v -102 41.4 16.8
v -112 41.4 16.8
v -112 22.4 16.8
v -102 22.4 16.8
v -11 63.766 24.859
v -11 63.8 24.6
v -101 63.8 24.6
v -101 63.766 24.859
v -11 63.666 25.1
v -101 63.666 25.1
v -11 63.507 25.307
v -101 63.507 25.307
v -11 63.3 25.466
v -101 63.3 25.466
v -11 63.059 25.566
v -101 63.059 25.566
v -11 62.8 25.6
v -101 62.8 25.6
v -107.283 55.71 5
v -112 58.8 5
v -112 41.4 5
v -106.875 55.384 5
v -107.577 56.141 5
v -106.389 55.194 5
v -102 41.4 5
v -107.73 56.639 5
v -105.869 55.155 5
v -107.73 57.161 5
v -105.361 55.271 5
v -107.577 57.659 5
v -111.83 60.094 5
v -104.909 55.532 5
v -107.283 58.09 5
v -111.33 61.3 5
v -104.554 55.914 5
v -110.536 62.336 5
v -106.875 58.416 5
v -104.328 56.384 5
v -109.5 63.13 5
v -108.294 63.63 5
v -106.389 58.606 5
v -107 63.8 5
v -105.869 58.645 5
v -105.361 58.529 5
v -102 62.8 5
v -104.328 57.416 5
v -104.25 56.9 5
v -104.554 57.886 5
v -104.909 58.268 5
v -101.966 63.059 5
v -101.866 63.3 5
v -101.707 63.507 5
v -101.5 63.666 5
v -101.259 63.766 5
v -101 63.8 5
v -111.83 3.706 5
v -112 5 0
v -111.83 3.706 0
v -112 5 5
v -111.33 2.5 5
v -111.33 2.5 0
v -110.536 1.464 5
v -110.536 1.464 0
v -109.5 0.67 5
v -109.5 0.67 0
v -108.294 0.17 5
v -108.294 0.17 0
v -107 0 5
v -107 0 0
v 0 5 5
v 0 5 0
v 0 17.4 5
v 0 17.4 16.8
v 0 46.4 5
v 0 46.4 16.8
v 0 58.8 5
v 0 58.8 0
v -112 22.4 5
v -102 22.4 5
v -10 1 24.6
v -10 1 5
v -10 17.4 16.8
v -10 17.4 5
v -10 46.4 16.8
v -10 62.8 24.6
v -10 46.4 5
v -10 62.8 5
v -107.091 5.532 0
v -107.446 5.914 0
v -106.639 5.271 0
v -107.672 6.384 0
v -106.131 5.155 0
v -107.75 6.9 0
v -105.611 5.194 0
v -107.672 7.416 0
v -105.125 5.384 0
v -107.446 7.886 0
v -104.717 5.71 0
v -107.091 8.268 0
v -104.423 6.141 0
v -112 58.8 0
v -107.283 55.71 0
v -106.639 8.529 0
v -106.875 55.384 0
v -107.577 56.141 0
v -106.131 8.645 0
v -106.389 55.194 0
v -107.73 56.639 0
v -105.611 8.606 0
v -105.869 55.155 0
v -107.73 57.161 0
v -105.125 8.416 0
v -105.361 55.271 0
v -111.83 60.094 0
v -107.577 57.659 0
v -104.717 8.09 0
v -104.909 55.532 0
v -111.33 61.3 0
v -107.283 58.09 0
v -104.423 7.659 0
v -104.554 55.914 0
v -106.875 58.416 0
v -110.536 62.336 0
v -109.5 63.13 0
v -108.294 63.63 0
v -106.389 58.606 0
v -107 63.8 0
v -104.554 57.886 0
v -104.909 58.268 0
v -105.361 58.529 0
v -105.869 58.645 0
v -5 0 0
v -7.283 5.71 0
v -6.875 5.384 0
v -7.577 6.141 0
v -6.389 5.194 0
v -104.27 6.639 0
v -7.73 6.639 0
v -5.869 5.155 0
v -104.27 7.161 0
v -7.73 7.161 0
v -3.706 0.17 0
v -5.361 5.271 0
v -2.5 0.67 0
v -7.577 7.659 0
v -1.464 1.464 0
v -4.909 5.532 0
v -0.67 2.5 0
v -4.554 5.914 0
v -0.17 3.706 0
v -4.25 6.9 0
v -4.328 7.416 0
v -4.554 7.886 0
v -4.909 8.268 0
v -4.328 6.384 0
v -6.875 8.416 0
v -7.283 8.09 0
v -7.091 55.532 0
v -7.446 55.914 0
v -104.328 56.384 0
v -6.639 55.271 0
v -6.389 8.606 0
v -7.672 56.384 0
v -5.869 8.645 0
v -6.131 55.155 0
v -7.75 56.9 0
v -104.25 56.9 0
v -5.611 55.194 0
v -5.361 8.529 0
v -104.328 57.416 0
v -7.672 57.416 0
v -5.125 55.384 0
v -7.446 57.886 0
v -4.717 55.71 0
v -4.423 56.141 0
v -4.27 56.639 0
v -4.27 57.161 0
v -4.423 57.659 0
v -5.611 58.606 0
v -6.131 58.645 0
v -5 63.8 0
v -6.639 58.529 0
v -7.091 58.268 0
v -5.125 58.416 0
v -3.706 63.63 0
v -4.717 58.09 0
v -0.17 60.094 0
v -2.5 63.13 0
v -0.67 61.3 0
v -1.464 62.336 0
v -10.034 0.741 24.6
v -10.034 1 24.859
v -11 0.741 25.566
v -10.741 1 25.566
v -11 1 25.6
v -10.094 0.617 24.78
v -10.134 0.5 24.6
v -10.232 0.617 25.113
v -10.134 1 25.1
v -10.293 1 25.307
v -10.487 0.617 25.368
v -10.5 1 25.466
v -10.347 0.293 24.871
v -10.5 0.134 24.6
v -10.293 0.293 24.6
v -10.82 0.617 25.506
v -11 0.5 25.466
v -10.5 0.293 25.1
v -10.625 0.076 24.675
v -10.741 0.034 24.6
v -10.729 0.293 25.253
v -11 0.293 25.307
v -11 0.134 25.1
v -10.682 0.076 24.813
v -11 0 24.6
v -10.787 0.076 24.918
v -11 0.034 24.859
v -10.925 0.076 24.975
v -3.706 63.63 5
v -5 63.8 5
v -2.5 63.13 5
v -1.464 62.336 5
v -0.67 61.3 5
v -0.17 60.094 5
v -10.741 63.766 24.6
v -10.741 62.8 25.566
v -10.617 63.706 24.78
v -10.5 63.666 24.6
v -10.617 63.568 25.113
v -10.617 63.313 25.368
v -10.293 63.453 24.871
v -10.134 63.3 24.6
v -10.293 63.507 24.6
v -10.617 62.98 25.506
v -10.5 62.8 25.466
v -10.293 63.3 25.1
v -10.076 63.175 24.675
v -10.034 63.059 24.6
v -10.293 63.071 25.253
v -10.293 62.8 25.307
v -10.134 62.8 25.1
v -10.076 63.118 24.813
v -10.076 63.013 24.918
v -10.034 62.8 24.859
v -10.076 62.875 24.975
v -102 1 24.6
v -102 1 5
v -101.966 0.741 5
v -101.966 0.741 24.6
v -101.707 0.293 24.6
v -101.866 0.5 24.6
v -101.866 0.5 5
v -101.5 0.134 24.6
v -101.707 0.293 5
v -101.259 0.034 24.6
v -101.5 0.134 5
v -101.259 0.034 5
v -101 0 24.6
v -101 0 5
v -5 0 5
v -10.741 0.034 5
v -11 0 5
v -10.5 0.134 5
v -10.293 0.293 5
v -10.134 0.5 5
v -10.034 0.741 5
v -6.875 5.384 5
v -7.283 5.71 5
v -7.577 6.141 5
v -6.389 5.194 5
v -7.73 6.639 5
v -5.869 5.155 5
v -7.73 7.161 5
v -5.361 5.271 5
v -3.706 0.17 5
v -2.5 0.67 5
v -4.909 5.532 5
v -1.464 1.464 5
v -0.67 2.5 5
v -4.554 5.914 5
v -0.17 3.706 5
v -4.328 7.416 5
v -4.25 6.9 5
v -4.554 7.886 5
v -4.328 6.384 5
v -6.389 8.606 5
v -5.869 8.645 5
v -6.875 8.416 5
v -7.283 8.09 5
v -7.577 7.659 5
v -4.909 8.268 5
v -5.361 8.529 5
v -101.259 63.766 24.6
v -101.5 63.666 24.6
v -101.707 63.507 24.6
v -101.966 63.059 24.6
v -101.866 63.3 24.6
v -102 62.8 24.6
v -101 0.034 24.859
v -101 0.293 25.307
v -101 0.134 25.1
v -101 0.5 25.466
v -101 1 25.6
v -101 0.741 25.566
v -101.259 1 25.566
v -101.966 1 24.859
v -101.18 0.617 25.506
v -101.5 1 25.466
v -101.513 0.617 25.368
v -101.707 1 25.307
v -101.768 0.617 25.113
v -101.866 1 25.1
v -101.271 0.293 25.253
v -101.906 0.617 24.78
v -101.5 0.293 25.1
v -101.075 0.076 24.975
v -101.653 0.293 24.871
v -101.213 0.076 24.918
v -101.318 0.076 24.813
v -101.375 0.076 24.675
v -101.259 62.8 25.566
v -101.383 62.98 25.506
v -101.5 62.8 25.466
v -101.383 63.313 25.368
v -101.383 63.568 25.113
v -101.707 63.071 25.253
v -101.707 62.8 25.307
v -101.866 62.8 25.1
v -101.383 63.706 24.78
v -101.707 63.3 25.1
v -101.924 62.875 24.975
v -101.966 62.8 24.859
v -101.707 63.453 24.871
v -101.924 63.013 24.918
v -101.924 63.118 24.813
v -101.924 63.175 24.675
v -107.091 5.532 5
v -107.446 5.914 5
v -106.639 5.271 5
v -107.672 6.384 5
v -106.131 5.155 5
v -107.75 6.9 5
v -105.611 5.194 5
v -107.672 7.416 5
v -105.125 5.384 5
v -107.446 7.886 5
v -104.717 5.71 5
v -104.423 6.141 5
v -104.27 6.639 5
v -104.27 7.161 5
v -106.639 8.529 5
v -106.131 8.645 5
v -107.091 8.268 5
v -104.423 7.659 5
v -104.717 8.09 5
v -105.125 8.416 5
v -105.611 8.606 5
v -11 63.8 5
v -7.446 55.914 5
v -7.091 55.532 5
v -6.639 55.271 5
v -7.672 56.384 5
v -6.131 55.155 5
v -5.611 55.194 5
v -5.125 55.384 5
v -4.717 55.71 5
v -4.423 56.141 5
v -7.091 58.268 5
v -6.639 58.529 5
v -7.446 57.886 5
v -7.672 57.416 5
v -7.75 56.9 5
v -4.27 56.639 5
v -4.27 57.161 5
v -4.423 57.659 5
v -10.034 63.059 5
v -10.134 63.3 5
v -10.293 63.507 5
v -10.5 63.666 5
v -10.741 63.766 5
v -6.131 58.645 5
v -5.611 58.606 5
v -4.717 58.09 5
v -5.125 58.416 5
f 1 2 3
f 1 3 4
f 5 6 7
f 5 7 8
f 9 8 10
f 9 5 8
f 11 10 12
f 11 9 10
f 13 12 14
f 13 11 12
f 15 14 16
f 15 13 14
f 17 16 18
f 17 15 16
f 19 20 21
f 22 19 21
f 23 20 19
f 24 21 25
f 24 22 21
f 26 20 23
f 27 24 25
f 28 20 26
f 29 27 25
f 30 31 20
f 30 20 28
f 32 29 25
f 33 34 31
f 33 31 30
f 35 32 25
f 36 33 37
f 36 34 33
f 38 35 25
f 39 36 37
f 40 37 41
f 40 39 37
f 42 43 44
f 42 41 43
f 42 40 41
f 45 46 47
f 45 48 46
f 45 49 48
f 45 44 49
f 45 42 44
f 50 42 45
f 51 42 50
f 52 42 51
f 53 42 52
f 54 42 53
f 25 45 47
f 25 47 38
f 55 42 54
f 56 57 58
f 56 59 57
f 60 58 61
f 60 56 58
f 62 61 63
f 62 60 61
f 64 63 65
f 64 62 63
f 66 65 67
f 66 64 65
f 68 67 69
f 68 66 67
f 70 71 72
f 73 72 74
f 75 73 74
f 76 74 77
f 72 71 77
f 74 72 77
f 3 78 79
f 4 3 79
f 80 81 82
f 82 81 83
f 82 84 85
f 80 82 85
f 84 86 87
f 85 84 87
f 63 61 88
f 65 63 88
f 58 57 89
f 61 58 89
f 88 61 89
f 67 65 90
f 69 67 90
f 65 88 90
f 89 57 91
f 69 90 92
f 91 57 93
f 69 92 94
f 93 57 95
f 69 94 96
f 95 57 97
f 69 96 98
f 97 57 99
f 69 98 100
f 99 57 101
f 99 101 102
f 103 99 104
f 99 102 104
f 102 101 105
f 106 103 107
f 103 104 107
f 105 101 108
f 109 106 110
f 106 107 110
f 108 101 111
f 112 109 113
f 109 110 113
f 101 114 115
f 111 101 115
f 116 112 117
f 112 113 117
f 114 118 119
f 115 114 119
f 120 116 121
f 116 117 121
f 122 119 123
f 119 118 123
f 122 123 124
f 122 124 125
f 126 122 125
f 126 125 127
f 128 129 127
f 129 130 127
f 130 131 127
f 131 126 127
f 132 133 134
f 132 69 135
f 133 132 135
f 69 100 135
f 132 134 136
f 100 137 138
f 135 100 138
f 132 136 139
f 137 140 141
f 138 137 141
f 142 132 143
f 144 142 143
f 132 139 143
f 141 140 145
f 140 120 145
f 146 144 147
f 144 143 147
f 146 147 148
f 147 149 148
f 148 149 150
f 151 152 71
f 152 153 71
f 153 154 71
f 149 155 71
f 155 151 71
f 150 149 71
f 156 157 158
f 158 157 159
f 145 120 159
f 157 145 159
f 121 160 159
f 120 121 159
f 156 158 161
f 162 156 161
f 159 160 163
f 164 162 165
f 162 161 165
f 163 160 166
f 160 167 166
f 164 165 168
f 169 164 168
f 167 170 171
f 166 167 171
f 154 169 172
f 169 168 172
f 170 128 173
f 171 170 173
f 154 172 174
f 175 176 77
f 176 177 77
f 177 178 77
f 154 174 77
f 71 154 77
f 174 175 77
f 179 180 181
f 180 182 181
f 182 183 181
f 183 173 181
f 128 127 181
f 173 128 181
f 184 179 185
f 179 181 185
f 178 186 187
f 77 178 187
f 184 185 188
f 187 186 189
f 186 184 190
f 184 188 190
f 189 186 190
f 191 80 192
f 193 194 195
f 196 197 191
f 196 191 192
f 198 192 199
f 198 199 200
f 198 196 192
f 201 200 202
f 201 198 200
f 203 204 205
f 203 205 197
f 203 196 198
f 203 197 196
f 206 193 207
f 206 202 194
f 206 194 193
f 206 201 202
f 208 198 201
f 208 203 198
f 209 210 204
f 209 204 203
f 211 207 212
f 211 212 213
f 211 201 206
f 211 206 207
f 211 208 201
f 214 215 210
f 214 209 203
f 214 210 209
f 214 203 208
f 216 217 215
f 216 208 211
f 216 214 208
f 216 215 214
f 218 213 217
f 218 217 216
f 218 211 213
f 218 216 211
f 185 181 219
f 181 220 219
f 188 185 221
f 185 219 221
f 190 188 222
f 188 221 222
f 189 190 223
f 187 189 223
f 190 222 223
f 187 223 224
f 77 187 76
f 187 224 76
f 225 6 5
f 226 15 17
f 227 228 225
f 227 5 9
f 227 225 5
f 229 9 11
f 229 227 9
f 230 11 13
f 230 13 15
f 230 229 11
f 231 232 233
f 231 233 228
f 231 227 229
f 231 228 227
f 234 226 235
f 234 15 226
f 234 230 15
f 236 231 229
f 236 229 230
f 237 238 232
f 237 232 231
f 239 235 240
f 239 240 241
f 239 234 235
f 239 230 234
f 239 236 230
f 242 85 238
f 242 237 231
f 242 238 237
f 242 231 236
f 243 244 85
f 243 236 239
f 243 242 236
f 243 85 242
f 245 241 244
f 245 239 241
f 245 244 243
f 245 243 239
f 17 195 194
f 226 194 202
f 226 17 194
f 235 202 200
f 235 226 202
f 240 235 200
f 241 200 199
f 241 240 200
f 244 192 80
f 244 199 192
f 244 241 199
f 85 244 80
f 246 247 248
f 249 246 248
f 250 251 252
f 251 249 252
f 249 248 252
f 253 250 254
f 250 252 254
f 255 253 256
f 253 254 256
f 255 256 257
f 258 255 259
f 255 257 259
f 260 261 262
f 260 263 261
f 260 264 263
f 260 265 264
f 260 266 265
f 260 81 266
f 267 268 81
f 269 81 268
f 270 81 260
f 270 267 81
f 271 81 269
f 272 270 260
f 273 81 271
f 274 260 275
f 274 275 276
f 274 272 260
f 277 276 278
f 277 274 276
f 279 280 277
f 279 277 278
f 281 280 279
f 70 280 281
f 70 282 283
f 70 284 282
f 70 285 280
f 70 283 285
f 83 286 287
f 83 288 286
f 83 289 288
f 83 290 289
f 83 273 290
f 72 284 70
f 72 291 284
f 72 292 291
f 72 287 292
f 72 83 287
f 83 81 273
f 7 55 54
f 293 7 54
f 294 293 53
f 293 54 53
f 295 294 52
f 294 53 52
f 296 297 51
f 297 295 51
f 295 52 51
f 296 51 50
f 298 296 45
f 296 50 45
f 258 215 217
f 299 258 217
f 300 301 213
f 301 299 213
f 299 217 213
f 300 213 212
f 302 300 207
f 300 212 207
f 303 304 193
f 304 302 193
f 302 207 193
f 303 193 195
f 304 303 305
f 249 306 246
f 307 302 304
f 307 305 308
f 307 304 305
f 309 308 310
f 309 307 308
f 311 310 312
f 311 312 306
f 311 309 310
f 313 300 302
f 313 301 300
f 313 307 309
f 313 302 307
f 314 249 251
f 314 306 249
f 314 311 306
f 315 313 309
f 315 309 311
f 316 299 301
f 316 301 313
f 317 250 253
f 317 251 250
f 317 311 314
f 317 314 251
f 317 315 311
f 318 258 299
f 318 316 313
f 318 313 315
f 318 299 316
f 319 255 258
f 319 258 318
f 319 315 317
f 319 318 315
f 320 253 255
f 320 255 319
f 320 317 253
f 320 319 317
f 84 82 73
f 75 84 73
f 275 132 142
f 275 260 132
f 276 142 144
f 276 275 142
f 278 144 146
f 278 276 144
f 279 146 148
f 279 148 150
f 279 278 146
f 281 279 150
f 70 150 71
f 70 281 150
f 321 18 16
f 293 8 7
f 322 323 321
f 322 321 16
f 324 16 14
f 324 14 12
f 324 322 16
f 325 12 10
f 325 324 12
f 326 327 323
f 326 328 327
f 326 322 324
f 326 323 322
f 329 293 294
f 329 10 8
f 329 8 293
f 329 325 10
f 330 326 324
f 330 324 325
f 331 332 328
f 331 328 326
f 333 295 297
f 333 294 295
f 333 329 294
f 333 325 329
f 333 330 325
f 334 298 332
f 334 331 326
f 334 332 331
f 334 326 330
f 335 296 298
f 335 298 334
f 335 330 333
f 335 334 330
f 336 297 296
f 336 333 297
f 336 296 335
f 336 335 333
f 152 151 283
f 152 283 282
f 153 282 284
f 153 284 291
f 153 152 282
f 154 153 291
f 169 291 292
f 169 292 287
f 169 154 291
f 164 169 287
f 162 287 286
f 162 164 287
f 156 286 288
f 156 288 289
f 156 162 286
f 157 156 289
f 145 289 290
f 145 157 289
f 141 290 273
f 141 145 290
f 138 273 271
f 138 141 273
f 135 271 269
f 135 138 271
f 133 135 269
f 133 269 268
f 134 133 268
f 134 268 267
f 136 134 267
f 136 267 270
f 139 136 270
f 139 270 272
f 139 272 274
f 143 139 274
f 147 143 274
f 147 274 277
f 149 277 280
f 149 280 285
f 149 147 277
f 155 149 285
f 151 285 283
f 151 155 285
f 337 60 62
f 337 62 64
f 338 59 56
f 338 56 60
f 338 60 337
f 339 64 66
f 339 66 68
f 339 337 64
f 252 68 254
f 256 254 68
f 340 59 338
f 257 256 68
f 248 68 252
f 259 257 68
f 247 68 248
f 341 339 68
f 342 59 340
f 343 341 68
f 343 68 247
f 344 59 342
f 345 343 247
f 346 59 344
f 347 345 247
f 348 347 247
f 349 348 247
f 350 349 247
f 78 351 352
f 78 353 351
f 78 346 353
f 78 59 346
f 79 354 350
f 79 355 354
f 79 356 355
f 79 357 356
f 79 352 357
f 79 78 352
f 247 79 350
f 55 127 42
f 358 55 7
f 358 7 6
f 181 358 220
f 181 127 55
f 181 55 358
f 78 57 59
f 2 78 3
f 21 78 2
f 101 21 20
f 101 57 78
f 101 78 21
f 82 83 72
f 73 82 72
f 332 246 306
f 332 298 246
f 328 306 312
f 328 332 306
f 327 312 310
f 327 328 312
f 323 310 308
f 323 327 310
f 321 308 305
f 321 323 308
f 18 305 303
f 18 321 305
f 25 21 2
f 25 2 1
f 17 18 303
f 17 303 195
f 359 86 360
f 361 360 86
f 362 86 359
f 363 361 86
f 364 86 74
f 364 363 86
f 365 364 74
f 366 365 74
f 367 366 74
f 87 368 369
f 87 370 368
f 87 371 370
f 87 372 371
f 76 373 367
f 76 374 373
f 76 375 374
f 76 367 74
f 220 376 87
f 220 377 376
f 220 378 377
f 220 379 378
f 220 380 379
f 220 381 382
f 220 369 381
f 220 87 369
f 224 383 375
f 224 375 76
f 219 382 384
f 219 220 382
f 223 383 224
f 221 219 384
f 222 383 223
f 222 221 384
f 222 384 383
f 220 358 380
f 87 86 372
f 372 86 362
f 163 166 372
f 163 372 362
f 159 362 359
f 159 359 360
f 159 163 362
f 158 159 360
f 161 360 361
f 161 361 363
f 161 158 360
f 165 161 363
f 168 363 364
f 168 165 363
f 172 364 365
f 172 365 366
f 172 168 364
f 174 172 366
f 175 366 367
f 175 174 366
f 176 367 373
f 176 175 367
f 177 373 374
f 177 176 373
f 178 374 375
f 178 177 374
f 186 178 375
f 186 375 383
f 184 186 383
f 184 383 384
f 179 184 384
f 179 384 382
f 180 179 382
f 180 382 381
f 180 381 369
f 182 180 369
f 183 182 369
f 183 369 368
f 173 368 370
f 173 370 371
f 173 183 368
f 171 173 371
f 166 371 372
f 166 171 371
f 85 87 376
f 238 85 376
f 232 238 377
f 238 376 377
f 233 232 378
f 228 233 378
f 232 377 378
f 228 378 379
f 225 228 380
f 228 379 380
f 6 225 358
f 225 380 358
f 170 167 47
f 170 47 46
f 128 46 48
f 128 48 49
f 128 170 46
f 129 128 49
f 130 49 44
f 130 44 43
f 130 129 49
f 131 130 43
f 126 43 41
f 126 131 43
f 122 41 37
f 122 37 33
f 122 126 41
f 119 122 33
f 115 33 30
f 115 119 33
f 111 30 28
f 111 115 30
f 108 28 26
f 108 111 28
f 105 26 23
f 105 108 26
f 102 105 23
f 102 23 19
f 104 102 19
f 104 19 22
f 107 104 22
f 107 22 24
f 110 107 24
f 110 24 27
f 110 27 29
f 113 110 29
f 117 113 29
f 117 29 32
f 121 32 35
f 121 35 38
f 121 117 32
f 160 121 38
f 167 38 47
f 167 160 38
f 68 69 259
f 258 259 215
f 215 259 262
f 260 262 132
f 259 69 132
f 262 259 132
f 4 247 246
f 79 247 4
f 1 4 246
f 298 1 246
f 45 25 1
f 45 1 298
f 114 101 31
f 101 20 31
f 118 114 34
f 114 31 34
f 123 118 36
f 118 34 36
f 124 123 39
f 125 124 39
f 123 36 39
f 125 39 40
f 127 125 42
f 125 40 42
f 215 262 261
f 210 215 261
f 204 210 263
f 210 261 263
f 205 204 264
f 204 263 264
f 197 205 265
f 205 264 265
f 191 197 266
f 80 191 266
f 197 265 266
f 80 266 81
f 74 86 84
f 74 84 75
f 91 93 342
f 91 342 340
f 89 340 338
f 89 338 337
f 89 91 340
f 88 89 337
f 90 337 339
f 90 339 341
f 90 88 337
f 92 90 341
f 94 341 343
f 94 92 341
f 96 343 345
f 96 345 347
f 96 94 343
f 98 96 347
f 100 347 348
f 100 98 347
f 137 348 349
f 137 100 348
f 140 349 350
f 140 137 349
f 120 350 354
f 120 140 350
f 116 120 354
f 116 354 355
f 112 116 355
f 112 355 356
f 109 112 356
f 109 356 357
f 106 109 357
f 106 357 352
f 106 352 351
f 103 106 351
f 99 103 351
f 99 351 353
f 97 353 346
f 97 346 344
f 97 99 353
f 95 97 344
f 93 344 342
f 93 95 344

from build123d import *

# Parameters (mm, degrees)
SKETCH1_W           = 112
SKETCH1_H           = 63.8
SKETCH1_R           = 1.75
BOSS_EXTRUDE1_DEPTH = 5
SKETCH2_W           = 92
SKETCH2_H           = 63.8
BOSS_EXTRUDE2_DEPTH = 20.6
SKETCH3_W           = 10
SKETCH3_H           = 19
SKETCH3_H_2         = 29
BOSS_EXTRUDE3_DEPTH = 11.8
FILLET1_R           = 5
FILLET2_R           = 1
FILLET3_R           = 1


with BuildPart() as part:
    # Sketch1 → Boss-Extrude1 (new body)
    with BuildSketch(Plane.XY):
        with Locations((-56, 31.9)):
            Rectangle(SKETCH1_W, SKETCH1_H)
        with Locations((-106, 56.9)):
            Circle(SKETCH1_R, mode=Mode.SUBTRACT)
        with Locations(Location((-6, 56.9, 0), (0, 0, 180))):
            Circle(SKETCH1_R, mode=Mode.SUBTRACT)
        with Locations((-6, 6.9)):
            Circle(SKETCH1_R, mode=Mode.SUBTRACT)
        with Locations(Location((-106, 6.9, 0), (0, 0, 180))):
            Circle(SKETCH1_R, mode=Mode.SUBTRACT)
    extrude(amount=BOSS_EXTRUDE1_DEPTH)

    # Sketch2 → Boss-Extrude2 (add)
    with BuildSketch(Plane.XY.offset(5)):
        with Locations((-56, 31.9)):
            Rectangle(SKETCH2_W, SKETCH2_H)
    extrude(amount=BOSS_EXTRUDE2_DEPTH)

    # Sketch3 → Boss-Extrude3 (add)
    with BuildSketch(Plane.XY.offset(5)):
        with Locations((-107, 31.9)):
            Rectangle(SKETCH3_W, SKETCH3_H)
        with Locations((-5, 31.9)):
            Rectangle(SKETCH3_W, SKETCH3_H_2)
    extrude(amount=BOSS_EXTRUDE3_DEPTH)

    # Fillet1
    fillet1_edges = [part.edges().sort_by_distance(p)[0] for p in [
        (0, 0, 2.5),
        (-112, 0, 2.5),
        (-112, 63.8, 2.5),
        (0, 63.8, 2.5),
    ]]
    fillet(fillet1_edges, radius=FILLET1_R)

    # Fillet2
    fillet2_edges = [part.edges().sort_by_distance(p)[0] for p in [
        (-102, 31.9, 25.6),
        (-56, 0, 25.6),
        (-10, 31.9, 25.6),
        (-56, 63.8, 25.6),
    ]]
    fillet(fillet2_edges, radius=FILLET2_R)

    # Fillet3
    # the kernel refuses this fillet: 1 mm, written as the material it takes off along each edge
    with BuildSketch(Plane(origin=(-11, 1, 24.6), x_dir=(1, 0, 0), z_dir=(0, -1, 0))) as fillet3_piece_1_section:
        Polygon((0, 0), (FILLET3_R, 0), (FILLET3_R, FILLET3_R), (0, FILLET3_R), align=None)
    fillet3_piece_1 = extrude(amount=FILLET3_R, mode=Mode.PRIVATE)
    fillet3_piece_1 = fillet3_piece_1 - Plane(origin=(-11, 1, 24.6), x_dir=(-0.7071067811865475, 0, -0.7071067811865475), z_dir=(0, -1, 0)) * Sphere(FILLET3_R, mode=Mode.PRIVATE)
    add(fillet3_piece_1, mode=Mode.SUBTRACT)
    with BuildSketch(Plane(origin=(-101, 1, 24.6), x_dir=(-1, 0, 0), z_dir=(0, -1, 0))) as fillet3_piece_2_section:
        Polygon((0, 0), (FILLET3_R, 0), (FILLET3_R, -FILLET3_R), (0, -FILLET3_R), align=None)
    fillet3_piece_2 = extrude(amount=FILLET3_R, mode=Mode.PRIVATE)
    fillet3_piece_2 = fillet3_piece_2 - Plane(origin=(-101, 1, 24.6), x_dir=(0.7071067811865475, 0, -0.7071067811865475), z_dir=(0, -1, 0)) * Sphere(FILLET3_R, mode=Mode.PRIVATE)
    add(fillet3_piece_2, mode=Mode.SUBTRACT)
    with BuildSketch(Plane(origin=(-11, 62.8, 24.6), x_dir=(0, 1, 0), z_dir=(1, 0, 0))) as fillet3_piece_3_section:
        Polygon((0, 0), (FILLET3_R, 0), (FILLET3_R, FILLET3_R), (0, FILLET3_R), align=None)
    fillet3_piece_3 = extrude(amount=FILLET3_R, mode=Mode.PRIVATE)
    fillet3_piece_3 = fillet3_piece_3 - Plane(origin=(-11, 62.8, 24.6), x_dir=(0, -0.7071067811865475, -0.7071067811865475), z_dir=(1, 0, 0)) * Sphere(FILLET3_R, mode=Mode.PRIVATE)
    add(fillet3_piece_3, mode=Mode.SUBTRACT)
    with BuildSketch(Plane(origin=(-101, 62.8, 24.6), x_dir=(0, 1, 0), z_dir=(-1, 0, 0))) as fillet3_piece_4_section:
        Polygon((0, 0), (FILLET3_R, 0), (FILLET3_R, -FILLET3_R), (0, -FILLET3_R), align=None)
    fillet3_piece_4 = extrude(amount=FILLET3_R, mode=Mode.PRIVATE)
    fillet3_piece_4 = fillet3_piece_4 - Plane(origin=(-101, 62.8, 24.6), x_dir=(0, -0.7071067811865475, -0.7071067811865475), z_dir=(-1, 0, 0)) * Sphere(FILLET3_R, mode=Mode.PRIVATE)
    add(fillet3_piece_4, mode=Mode.SUBTRACT)
    with BuildSketch(Plane(origin=(-102, 63.8, 5), x_dir=(0, -1, 0), z_dir=(0, 0, 1)), Plane(origin=(-102, 0, 5), x_dir=(1, 0, 0), z_dir=(0, 0, 1))) as fillet3_piece_5:
        with BuildLine():
            CenterArc((FILLET3_R, FILLET3_R), FILLET3_R, 180, 90)
            Line((0, FILLET3_R), (0, 0))
            Line((0, 0), (FILLET3_R, 0))
        make_face()
    extrude(amount=19.6, mode=Mode.SUBTRACT)
    with BuildSketch(Plane(origin=(-10, 63.8, 5), x_dir=(0, -1, 0), z_dir=(0, 0, 1)), Plane(origin=(-10, 0, 5), x_dir=(-1, 0, 0), z_dir=(0, 0, 1))) as fillet3_piece_6:
        with BuildLine():
            CenterArc((FILLET3_R, -FILLET3_R), FILLET3_R, 90, 90)
            Line((0, -FILLET3_R), (0, 0))
            Line((0, 0), (FILLET3_R, 0))
        make_face()
    extrude(amount=19.6, mode=Mode.SUBTRACT)


solid = part.part
